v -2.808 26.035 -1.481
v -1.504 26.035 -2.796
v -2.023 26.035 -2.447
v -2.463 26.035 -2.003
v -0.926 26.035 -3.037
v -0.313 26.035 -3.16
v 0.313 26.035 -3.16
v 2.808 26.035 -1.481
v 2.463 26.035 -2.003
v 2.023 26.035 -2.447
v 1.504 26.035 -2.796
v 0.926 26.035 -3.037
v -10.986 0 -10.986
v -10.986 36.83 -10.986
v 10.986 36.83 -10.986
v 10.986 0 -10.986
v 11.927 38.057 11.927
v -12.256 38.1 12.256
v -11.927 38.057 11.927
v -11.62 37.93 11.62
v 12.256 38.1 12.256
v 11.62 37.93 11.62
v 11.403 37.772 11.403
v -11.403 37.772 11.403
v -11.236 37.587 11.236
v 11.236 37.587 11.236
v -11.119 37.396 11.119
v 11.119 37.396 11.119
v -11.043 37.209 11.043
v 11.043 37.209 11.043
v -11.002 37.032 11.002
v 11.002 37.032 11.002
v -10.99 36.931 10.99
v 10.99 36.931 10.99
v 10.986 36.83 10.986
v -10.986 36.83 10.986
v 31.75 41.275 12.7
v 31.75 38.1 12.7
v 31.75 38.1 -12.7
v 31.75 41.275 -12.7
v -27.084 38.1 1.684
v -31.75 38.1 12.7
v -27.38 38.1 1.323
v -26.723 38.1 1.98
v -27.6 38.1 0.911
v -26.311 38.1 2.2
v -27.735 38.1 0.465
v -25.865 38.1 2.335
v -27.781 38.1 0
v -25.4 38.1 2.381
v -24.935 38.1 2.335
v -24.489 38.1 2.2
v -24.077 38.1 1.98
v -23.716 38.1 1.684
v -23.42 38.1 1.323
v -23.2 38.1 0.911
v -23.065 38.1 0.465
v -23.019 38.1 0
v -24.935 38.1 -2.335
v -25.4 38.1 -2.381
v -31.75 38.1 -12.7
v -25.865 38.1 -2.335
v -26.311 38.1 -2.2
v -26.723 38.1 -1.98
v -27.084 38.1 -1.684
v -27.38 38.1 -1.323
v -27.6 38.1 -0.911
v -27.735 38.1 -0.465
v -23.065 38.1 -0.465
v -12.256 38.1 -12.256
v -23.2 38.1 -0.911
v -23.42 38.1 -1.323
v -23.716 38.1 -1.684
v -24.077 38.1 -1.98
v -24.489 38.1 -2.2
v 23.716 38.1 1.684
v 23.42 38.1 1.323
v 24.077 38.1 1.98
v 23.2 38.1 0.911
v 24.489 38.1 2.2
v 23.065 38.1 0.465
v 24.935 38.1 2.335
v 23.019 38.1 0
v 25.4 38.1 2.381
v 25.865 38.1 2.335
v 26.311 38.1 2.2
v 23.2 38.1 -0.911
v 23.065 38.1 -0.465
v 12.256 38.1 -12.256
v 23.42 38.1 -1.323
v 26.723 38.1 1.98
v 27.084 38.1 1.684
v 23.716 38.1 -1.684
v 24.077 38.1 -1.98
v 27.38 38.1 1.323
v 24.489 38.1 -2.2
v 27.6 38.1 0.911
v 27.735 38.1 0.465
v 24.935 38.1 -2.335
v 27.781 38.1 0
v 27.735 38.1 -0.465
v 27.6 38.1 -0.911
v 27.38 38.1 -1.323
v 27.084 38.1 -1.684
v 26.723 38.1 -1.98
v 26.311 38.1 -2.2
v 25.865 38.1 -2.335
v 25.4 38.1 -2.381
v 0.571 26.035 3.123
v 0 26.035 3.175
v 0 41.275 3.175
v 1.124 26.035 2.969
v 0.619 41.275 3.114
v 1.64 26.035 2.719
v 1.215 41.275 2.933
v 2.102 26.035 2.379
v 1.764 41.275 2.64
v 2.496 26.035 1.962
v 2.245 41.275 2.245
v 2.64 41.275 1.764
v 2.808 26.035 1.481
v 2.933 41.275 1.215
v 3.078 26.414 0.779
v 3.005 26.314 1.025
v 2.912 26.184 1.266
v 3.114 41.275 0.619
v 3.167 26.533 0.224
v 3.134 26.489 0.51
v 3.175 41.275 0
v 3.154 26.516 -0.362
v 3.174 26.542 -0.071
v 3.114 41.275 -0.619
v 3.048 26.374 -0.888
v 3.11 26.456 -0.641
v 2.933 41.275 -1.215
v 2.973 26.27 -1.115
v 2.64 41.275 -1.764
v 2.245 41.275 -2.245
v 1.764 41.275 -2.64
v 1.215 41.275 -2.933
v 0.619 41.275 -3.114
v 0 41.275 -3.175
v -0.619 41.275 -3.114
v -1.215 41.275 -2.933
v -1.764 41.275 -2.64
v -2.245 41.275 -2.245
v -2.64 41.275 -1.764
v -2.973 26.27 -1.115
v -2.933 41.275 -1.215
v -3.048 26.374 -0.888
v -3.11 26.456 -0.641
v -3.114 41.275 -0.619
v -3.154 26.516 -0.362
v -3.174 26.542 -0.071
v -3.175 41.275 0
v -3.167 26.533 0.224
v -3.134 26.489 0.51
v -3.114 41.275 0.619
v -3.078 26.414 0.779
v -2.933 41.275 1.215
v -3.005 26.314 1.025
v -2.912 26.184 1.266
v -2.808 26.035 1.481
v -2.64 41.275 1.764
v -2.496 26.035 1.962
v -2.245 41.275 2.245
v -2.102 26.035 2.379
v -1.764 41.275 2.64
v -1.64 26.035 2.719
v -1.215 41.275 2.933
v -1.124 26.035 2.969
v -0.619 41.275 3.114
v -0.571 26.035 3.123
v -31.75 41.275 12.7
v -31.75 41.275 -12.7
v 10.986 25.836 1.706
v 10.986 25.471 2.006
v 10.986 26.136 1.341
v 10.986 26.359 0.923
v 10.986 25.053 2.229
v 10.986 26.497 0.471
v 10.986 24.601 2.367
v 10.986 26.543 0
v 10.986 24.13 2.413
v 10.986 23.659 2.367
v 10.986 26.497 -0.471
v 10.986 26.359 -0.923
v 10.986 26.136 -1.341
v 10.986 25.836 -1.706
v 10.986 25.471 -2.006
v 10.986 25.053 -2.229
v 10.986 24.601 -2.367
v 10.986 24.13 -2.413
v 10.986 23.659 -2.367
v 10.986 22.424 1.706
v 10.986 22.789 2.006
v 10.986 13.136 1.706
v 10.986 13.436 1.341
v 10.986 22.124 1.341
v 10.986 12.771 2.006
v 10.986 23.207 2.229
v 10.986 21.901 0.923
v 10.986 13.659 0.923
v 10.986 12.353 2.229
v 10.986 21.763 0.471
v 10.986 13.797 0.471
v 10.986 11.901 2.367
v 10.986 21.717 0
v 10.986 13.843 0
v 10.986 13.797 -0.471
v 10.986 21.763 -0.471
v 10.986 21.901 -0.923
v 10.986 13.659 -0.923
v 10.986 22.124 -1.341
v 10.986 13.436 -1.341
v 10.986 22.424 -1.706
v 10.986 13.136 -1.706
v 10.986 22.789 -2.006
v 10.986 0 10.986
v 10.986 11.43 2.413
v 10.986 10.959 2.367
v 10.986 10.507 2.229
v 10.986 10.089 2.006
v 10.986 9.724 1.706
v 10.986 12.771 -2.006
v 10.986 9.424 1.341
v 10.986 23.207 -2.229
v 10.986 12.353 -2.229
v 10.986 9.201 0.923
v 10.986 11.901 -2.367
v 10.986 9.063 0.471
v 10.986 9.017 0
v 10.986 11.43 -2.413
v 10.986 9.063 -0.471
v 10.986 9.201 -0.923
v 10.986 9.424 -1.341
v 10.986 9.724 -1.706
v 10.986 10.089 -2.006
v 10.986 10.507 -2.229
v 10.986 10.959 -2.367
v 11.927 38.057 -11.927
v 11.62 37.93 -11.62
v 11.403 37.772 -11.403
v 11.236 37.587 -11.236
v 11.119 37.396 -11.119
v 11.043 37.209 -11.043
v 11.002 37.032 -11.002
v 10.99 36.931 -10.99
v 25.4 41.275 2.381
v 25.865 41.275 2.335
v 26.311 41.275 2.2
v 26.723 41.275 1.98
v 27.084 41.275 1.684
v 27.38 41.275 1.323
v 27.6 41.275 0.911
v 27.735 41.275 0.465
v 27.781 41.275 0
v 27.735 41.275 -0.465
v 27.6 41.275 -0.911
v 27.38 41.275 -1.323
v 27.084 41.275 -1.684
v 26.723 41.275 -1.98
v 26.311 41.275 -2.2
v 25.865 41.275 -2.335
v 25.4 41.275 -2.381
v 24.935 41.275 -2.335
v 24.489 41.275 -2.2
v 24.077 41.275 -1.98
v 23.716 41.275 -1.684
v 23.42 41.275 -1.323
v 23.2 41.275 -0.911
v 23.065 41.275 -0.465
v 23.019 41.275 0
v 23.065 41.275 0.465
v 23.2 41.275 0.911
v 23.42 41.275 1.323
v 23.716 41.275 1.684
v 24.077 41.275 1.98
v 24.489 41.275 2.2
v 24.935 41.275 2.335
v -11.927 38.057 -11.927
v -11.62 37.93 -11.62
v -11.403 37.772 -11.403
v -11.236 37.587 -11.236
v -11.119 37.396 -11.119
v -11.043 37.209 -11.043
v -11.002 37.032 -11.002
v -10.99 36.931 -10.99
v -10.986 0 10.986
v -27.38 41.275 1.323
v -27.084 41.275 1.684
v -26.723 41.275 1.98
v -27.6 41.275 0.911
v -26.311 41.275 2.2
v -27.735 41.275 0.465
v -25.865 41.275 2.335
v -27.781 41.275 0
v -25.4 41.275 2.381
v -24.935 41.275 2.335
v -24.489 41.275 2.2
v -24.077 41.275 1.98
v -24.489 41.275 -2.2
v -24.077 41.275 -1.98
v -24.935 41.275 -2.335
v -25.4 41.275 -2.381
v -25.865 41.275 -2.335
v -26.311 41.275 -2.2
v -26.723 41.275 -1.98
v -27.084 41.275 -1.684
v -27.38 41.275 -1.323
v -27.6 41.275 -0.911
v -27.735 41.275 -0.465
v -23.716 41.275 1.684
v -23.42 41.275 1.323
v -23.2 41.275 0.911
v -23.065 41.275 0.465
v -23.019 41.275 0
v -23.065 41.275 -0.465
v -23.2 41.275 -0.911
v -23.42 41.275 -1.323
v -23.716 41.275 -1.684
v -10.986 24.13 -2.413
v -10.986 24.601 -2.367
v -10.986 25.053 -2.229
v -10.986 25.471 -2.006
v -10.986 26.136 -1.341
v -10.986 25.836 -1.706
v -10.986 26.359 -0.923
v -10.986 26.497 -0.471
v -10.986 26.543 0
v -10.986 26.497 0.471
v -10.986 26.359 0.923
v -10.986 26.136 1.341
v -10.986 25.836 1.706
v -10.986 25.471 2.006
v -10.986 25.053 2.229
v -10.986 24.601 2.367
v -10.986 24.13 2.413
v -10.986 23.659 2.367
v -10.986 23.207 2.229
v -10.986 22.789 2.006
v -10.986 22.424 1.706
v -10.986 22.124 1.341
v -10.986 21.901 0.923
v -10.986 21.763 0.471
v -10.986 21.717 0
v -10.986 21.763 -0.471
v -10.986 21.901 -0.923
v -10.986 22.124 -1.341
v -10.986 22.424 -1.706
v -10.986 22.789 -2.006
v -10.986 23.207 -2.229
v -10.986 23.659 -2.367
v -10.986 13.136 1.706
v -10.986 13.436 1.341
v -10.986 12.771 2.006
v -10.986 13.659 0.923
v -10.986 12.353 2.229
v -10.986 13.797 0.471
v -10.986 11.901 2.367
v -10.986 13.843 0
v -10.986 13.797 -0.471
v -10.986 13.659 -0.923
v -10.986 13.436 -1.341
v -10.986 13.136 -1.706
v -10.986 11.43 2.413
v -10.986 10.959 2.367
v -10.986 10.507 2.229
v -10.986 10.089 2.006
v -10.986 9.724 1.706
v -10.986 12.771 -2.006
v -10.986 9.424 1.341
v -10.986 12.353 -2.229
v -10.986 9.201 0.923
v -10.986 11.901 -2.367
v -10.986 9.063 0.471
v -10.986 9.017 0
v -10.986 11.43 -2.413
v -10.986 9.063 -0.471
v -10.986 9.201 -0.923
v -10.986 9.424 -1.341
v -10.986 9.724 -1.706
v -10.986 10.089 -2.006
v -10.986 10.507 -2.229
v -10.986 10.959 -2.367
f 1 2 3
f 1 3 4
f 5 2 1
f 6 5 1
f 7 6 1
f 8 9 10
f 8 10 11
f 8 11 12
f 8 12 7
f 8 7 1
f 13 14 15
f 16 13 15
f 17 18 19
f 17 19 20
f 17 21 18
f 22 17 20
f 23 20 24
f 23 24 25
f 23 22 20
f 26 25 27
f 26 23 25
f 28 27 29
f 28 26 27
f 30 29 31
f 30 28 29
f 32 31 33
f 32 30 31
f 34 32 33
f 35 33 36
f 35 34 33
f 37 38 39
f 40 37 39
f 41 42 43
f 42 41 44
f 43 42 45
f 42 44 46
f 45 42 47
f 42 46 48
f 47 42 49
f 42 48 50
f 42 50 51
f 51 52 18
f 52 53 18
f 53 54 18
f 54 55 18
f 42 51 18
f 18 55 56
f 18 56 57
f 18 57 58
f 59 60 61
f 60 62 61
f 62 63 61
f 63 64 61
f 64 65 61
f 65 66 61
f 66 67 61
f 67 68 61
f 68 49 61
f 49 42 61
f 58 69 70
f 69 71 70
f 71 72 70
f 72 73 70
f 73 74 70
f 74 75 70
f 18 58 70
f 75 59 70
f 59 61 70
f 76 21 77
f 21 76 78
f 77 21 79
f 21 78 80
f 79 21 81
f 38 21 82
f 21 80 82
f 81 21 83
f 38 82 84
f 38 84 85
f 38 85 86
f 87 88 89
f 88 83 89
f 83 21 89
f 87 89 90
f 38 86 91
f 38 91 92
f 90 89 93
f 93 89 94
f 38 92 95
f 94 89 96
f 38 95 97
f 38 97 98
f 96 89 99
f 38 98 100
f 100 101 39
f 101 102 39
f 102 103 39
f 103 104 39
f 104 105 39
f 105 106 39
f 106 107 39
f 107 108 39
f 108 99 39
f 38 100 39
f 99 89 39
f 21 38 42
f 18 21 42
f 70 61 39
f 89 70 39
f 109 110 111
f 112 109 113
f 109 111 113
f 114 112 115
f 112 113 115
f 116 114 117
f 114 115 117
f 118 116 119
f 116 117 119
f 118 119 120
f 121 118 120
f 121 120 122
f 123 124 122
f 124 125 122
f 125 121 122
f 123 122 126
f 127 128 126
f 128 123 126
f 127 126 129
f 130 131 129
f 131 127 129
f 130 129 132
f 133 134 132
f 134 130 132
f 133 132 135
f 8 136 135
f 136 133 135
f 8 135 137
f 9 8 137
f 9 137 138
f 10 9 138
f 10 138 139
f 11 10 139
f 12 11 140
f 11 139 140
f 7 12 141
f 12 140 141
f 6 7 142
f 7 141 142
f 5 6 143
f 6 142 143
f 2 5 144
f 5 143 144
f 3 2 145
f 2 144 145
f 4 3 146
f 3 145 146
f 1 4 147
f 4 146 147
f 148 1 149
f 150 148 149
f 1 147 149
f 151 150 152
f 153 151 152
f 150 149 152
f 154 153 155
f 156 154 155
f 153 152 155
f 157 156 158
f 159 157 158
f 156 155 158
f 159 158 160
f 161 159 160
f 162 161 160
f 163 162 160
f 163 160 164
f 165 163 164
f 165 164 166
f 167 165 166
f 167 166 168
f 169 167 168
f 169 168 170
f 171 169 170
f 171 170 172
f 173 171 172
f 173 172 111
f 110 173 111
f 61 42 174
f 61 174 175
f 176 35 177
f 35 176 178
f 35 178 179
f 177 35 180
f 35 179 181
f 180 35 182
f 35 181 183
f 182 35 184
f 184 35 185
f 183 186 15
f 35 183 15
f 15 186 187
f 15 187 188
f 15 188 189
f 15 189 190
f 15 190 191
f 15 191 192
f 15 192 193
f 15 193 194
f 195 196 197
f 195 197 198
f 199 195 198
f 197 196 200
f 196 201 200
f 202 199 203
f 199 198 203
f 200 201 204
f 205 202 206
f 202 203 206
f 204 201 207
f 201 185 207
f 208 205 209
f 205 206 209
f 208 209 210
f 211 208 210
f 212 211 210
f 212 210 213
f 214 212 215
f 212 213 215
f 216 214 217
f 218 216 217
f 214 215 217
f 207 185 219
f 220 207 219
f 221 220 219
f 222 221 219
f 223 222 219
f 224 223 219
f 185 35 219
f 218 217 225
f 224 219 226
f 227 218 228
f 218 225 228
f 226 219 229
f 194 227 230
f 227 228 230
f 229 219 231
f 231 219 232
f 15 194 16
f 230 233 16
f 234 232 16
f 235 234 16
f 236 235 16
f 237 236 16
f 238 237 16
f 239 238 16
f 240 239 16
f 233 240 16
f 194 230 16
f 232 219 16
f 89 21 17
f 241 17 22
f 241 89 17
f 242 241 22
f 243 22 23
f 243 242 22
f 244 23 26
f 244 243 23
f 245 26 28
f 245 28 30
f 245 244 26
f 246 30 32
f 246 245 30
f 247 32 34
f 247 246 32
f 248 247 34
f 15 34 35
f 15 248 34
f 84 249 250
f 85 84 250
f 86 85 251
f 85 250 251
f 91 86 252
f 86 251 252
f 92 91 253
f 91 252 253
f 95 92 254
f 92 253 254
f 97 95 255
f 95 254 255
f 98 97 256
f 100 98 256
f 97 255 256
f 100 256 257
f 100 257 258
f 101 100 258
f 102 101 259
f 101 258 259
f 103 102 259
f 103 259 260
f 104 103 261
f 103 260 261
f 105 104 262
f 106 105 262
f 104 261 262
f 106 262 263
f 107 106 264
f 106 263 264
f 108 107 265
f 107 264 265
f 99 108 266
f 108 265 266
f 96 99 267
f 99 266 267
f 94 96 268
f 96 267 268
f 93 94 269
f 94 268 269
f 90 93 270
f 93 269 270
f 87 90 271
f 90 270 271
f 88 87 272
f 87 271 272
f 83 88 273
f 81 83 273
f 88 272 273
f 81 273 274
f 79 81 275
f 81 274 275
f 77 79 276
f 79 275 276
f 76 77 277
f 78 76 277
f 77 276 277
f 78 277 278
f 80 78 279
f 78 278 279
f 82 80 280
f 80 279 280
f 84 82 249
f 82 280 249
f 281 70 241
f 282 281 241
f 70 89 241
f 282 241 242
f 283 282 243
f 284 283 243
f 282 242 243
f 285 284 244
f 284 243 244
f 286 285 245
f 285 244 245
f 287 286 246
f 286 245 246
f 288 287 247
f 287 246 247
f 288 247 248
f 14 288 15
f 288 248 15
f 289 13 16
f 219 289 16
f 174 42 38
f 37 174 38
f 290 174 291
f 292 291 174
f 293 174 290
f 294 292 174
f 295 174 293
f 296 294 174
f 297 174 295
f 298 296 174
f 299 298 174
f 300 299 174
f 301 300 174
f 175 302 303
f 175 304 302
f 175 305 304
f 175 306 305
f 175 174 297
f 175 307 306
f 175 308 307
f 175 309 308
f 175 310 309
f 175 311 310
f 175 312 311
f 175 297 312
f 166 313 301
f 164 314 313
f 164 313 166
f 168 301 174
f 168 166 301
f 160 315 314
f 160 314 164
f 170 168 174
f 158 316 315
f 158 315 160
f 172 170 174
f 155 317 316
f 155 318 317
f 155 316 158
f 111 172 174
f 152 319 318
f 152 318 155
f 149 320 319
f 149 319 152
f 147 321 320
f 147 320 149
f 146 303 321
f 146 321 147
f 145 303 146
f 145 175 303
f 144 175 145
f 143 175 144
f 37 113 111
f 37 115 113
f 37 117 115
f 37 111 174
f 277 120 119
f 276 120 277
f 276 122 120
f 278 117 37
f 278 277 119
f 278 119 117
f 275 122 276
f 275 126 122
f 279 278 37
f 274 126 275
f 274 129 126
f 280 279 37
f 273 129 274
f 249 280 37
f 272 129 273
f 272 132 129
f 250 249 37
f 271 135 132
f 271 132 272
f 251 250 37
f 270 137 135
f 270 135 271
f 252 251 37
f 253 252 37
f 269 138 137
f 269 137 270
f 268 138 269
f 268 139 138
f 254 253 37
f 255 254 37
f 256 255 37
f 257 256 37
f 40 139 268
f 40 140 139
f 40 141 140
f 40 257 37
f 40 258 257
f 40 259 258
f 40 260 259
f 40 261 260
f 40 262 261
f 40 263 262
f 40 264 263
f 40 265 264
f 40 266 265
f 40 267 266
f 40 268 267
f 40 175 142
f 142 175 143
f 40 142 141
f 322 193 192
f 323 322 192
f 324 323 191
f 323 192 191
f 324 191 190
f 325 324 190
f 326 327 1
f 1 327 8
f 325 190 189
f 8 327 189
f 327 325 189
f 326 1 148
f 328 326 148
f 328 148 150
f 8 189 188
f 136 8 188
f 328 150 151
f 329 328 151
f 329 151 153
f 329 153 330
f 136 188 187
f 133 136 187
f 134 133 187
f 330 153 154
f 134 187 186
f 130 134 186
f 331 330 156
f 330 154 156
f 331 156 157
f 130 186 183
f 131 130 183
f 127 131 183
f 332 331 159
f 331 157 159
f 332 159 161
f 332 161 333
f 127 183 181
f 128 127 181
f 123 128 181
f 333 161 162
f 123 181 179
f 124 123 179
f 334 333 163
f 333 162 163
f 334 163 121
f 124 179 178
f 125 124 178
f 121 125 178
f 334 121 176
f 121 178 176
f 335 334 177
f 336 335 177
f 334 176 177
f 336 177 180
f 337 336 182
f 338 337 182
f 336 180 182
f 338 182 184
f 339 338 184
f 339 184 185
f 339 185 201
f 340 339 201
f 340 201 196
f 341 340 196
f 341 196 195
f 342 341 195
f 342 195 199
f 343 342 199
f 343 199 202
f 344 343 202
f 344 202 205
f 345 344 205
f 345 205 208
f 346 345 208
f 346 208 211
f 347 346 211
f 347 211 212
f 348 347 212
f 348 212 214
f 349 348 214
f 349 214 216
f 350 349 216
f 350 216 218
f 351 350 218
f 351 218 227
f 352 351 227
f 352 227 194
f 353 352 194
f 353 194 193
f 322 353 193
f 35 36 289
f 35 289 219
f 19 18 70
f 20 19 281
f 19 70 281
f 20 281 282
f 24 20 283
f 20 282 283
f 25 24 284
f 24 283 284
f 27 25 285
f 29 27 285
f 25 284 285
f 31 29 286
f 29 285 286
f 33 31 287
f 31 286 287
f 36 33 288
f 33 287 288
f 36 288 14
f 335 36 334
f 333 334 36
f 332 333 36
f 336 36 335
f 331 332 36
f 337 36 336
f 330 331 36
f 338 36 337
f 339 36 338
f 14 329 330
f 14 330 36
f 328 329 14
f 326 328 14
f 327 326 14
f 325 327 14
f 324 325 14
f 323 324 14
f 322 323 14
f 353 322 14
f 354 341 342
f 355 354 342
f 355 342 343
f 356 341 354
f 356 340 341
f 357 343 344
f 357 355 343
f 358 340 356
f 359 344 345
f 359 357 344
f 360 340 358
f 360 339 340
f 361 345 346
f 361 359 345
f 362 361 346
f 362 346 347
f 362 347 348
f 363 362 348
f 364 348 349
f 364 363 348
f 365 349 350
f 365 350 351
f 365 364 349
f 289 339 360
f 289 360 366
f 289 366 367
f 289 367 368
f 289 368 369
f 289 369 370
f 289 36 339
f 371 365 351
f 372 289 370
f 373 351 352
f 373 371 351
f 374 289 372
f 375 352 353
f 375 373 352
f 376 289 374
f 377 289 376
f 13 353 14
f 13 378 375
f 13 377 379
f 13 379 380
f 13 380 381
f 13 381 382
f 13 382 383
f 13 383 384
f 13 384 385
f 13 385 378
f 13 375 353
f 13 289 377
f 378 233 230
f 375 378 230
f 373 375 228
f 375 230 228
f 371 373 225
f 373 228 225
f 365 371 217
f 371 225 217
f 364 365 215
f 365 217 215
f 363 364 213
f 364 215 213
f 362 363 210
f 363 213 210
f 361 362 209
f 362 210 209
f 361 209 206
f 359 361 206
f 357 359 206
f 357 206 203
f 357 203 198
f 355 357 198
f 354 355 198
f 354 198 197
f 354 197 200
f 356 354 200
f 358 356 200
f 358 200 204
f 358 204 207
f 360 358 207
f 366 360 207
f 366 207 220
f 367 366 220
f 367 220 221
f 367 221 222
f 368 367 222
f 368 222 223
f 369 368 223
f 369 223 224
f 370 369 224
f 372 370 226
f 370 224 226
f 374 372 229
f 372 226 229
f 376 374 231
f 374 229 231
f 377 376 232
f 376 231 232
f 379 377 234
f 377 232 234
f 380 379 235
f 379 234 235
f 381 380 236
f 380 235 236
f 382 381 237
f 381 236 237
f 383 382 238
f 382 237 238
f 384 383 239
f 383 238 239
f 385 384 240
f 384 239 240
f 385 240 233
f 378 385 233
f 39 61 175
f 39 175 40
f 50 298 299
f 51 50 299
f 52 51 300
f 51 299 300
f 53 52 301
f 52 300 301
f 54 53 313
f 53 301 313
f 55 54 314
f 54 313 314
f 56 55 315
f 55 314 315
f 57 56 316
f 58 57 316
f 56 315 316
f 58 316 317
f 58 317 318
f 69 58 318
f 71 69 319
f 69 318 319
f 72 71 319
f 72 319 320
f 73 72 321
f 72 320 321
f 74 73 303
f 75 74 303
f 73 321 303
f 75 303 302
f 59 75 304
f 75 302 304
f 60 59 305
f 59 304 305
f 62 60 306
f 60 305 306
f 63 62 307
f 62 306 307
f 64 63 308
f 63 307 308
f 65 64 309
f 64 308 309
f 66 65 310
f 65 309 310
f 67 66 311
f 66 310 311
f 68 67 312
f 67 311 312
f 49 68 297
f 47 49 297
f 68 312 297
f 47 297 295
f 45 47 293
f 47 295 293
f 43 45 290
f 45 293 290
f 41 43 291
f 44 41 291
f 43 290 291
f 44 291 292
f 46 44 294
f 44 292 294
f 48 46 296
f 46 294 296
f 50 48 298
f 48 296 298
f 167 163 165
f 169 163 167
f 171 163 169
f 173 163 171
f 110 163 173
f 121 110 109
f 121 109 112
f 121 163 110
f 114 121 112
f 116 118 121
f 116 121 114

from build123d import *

# Parameters (mm, degrees)
SKETCH1_W           = 21.971
SKETCH1_H           = 21.971
BOSS_EXTRUDE1_DEPTH = 38.1
SKETCH2_W           = 63.5
SKETCH2_H           = 25.4
BOSS_EXTRUDE2_DEPTH = 3.175
SKETCH3_R           = 2.38125
CUT_EXTRUDE1_DEPTH  = 3.175
FILLET1_R           = 1.27
SKETCH4_R           = 3.175
CUT_EXTRUDE2_DEPTH  = 15.24
SKETCH5_R           = 2.413
CUT_EXTRUDE3_DEPTH  = 25.4


with BuildPart() as part:
    # Sketch1 → Boss-Extrude1 (new body)
    with BuildSketch(Plane(origin=(0, 0, 0), x_dir=(1, 0, 0), z_dir=(0, 1, 0))):
        Rectangle(SKETCH1_W, SKETCH1_H)
    extrude(amount=BOSS_EXTRUDE1_DEPTH)

    # Sketch2 → Boss-Extrude2 (add)
    with BuildSketch(Plane(origin=(0, 38.1, 0), x_dir=(1, 0, 0), z_dir=(0, 1, 0))):
        Rectangle(SKETCH2_W, SKETCH2_H)
    extrude(amount=BOSS_EXTRUDE2_DEPTH)

    # Sketch3 → Cut-Extrude1 (cut)
    with BuildSketch(Plane(origin=(0, 41.275, 0), x_dir=(1, 0, 0), z_dir=(0, 1, 0))):
        with Locations(Location((25.4, 0, 0), (0, 0, 270))):
            Circle(SKETCH3_R)
        with Locations(Location((-25.4, 0, 0), (0, 0, 270))):
            Circle(SKETCH3_R)
    extrude(amount=-CUT_EXTRUDE1_DEPTH, mode=Mode.SUBTRACT)

    # Fillet1
    fillet1_edges = [part.edges().sort_by_distance(p)[0] for p in [
        (-10.9855, 38.1, 0),
        (0, 38.1, 10.9855),
        (10.9855, 38.1, 0),
        (0, 38.1, -10.9855),
    ]]
    fillet(fillet1_edges, radius=FILLET1_R)

    # Sketch4 → Cut-Extrude2 (cut)
    with BuildSketch(Plane(origin=(0, 41.275, 0), x_dir=(1, 0, 0), z_dir=(0, 1, 0))):
        with Locations(Location((0, 0, 0), (0, 0, 270))):
            Circle(SKETCH4_R)
    extrude(amount=-CUT_EXTRUDE2_DEPTH, mode=Mode.SUBTRACT)

    # Sketch5 → Cut-Extrude3 (cut)
    with BuildSketch(Plane(origin=(10.9855, 0, 0), x_dir=(0, 0, -1), z_dir=(1, 0, 0))):
        with Locations((0, 24.13)):
            Circle(SKETCH5_R)
        with Locations((0, 11.43)):
            Circle(SKETCH5_R)
    extrude(amount=-CUT_EXTRUDE3_DEPTH, mode=Mode.SUBTRACT)


solid = part.part
